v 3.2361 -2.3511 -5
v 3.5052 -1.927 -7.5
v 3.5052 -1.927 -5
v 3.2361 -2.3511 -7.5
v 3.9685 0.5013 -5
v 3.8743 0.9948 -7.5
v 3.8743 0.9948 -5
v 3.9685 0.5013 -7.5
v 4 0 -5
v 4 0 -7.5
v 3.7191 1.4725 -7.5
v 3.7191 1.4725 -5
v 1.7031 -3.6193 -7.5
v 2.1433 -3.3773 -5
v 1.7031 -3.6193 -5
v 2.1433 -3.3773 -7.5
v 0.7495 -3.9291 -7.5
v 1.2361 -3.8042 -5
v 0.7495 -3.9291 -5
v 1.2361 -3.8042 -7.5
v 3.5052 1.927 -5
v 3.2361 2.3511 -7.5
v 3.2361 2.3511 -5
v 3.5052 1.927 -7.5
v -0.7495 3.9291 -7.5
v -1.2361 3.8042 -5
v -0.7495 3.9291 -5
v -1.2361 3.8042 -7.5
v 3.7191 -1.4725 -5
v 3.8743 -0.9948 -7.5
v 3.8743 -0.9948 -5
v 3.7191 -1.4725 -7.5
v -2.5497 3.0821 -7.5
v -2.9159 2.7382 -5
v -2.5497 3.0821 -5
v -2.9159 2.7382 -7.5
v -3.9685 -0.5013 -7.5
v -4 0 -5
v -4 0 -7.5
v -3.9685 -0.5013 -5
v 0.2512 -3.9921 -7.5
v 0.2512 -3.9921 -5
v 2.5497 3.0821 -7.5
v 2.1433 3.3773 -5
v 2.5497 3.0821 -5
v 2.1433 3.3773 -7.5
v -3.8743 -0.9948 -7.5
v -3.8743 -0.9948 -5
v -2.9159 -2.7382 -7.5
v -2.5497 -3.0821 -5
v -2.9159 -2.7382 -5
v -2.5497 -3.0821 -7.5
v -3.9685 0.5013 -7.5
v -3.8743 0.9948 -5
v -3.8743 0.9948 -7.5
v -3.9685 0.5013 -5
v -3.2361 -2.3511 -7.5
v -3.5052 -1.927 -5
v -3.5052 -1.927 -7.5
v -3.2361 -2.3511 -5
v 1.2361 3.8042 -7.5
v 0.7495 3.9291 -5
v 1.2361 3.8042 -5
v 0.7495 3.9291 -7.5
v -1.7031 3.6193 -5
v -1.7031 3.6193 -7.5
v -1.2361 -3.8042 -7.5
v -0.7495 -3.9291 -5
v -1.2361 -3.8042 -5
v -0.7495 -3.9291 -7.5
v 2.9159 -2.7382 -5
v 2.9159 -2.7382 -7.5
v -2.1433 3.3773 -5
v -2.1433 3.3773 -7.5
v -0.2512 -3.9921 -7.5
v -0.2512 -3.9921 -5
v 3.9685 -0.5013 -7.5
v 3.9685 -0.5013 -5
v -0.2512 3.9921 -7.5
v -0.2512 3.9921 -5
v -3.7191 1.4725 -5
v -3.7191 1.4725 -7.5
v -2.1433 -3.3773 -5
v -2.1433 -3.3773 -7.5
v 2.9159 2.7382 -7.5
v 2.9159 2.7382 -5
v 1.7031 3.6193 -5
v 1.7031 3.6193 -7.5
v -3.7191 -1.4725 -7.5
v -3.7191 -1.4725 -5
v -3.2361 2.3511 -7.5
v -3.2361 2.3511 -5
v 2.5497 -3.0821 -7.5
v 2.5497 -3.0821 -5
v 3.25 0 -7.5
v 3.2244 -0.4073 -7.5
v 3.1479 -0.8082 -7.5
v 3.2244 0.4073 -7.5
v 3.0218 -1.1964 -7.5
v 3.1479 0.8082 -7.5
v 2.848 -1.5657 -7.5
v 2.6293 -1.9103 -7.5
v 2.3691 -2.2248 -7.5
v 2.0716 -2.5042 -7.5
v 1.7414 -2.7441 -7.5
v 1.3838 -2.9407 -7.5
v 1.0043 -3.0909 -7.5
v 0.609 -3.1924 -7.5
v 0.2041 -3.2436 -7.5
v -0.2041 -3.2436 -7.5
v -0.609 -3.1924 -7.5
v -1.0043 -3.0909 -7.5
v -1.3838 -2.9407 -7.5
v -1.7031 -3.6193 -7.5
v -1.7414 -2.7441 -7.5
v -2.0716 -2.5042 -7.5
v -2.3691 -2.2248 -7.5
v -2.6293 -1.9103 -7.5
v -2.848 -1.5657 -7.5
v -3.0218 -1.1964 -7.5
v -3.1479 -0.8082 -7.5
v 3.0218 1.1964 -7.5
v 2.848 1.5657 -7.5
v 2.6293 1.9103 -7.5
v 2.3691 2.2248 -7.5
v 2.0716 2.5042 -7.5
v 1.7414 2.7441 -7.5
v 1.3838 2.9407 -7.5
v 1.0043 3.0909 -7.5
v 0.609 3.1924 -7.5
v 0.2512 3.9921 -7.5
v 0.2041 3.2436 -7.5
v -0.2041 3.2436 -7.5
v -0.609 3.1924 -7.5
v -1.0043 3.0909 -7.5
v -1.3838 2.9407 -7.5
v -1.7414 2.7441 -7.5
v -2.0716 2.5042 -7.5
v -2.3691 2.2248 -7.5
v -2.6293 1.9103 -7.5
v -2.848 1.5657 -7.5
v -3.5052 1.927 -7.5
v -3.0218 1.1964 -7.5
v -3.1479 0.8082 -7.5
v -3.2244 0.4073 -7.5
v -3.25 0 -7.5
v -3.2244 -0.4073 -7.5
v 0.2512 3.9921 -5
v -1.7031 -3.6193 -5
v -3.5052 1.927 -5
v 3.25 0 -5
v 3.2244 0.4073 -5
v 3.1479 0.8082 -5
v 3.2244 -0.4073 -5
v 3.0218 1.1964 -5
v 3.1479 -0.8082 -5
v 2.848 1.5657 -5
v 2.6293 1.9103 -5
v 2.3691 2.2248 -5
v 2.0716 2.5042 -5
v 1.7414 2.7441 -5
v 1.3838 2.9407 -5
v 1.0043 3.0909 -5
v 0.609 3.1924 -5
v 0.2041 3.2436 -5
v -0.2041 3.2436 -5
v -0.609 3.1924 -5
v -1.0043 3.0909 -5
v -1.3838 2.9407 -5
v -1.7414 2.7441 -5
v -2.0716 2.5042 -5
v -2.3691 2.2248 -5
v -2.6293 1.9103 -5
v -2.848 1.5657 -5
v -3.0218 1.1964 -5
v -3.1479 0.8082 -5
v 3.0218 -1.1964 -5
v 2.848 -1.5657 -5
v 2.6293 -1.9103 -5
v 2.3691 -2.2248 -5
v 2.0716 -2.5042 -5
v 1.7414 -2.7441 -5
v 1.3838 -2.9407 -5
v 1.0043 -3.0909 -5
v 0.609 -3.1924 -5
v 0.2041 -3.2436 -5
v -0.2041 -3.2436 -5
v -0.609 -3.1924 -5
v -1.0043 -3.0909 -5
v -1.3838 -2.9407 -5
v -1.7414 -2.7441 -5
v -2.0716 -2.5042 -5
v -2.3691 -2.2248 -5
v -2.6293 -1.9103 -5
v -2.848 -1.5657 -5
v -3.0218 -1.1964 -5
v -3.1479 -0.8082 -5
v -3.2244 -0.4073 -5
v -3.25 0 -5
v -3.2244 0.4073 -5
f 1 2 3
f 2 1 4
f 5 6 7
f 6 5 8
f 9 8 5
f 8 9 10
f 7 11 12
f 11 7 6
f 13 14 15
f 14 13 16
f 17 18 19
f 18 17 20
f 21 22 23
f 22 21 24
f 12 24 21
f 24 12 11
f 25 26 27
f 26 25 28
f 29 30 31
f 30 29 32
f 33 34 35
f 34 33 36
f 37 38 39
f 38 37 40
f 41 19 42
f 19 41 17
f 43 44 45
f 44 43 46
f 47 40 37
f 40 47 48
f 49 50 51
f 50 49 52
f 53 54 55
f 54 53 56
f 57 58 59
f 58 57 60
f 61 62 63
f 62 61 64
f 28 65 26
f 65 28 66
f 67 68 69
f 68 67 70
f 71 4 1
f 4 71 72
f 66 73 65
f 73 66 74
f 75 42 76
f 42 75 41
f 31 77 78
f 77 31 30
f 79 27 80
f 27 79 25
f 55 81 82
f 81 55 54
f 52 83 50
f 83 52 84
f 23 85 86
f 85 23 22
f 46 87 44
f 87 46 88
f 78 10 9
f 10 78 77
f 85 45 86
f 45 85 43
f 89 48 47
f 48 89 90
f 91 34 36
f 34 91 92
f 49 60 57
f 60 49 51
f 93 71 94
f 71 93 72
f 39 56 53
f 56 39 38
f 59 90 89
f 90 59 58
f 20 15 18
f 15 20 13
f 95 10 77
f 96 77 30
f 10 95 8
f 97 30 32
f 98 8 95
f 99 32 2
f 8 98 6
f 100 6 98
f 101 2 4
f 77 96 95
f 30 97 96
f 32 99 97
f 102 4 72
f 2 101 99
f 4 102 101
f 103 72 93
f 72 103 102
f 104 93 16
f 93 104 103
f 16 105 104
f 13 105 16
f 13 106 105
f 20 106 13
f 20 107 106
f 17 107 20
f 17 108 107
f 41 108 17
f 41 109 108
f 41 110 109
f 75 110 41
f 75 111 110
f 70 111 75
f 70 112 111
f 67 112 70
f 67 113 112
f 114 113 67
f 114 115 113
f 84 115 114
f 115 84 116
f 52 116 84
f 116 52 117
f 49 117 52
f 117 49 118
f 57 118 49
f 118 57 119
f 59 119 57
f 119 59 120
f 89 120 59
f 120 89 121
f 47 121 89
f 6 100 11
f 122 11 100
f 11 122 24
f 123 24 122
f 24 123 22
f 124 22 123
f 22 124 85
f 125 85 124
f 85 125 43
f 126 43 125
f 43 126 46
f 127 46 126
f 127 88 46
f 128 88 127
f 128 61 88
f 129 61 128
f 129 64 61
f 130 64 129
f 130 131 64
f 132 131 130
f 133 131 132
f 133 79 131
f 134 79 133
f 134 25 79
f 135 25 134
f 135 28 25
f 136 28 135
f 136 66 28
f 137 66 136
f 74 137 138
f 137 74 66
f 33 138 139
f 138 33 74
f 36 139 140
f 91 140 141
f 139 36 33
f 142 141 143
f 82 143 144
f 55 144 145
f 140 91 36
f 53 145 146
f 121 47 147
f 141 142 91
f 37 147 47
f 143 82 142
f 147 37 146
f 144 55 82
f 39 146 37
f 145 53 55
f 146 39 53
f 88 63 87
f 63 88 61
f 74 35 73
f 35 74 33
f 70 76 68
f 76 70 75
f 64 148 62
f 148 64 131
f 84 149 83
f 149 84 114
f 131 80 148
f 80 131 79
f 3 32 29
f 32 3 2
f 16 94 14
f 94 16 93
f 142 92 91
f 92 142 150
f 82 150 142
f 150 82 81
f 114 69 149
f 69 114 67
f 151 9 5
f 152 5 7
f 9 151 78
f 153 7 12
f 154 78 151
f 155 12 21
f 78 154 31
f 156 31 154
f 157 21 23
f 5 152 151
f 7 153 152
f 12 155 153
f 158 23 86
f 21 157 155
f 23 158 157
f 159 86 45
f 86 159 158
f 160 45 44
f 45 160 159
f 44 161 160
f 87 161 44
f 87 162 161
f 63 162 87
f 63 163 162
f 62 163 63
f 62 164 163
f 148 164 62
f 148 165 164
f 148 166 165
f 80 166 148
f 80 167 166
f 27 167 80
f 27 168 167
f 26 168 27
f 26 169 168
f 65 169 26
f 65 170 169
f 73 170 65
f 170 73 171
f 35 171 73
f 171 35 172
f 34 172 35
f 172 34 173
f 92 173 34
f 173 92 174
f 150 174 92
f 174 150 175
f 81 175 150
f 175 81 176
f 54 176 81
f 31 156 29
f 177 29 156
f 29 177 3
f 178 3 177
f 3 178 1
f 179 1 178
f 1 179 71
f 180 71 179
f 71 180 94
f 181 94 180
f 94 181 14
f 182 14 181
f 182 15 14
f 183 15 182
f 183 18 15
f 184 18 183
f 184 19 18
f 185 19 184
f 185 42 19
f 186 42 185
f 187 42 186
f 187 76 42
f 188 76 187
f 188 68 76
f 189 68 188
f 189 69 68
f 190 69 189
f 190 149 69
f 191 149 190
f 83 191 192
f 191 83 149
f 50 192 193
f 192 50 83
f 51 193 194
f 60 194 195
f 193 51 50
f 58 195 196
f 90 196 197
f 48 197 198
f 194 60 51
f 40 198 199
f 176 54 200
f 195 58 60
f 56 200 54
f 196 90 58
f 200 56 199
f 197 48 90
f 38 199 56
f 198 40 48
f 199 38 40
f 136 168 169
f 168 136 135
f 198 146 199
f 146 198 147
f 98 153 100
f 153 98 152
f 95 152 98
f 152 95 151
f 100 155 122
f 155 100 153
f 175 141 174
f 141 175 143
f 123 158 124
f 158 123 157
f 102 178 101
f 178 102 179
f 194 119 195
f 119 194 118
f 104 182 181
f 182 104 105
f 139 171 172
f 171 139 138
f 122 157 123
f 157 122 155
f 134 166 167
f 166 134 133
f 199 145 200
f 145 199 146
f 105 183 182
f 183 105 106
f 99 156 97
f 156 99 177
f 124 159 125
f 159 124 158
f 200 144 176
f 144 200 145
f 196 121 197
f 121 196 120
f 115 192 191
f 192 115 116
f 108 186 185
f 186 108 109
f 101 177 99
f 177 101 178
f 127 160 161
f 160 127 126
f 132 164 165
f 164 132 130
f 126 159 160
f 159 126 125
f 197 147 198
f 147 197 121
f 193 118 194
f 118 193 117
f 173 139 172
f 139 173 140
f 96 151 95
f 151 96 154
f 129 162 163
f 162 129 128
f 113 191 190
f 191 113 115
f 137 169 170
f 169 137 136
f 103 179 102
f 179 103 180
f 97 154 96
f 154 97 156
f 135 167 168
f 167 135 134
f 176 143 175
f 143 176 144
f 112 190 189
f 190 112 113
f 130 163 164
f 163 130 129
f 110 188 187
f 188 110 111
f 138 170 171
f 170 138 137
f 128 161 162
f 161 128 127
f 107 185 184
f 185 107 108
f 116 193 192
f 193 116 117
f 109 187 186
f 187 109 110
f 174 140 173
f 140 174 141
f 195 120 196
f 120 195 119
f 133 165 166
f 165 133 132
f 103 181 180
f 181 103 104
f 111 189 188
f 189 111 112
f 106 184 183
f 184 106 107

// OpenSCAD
$fn = 50;

difference() {
	union() {
		translate(v = [0, 0, -7.5]) {
			cylinder(h = 10.5, r = 4.0);
		}
		#translate(v = [0, 0, -9.0]) {
			cylinder(h = 9, r = 2.875);
		}
	}
	union() {
		translate(v = [0, 0, 0]) {
			rotate(a = [0, 0, 0]) {
				difference() {
					union() {
						translate(v = [0, 0, -5]) {
							linear_extrude(height = 5) {
								polygon(points = [[5.914249999999999, 0.0], [2.957125, 5.1218907443321156], [-2.9571249999999982, 5.1218907443321156], [-5.914249999999999, 7.242867331857232e-16], [-2.9571250000000022, -5.121890744332115], [2.9571249999999956, -5.121890744332118]]);
							}
						}
					}
					union();
				}
			}
		}
		#cylinder(h = 3, r = 6.25);
		#translate(v = [0, 0, -100.0]) {
			cylinder(h = 200, r = 3.25);
		}
	}
}
